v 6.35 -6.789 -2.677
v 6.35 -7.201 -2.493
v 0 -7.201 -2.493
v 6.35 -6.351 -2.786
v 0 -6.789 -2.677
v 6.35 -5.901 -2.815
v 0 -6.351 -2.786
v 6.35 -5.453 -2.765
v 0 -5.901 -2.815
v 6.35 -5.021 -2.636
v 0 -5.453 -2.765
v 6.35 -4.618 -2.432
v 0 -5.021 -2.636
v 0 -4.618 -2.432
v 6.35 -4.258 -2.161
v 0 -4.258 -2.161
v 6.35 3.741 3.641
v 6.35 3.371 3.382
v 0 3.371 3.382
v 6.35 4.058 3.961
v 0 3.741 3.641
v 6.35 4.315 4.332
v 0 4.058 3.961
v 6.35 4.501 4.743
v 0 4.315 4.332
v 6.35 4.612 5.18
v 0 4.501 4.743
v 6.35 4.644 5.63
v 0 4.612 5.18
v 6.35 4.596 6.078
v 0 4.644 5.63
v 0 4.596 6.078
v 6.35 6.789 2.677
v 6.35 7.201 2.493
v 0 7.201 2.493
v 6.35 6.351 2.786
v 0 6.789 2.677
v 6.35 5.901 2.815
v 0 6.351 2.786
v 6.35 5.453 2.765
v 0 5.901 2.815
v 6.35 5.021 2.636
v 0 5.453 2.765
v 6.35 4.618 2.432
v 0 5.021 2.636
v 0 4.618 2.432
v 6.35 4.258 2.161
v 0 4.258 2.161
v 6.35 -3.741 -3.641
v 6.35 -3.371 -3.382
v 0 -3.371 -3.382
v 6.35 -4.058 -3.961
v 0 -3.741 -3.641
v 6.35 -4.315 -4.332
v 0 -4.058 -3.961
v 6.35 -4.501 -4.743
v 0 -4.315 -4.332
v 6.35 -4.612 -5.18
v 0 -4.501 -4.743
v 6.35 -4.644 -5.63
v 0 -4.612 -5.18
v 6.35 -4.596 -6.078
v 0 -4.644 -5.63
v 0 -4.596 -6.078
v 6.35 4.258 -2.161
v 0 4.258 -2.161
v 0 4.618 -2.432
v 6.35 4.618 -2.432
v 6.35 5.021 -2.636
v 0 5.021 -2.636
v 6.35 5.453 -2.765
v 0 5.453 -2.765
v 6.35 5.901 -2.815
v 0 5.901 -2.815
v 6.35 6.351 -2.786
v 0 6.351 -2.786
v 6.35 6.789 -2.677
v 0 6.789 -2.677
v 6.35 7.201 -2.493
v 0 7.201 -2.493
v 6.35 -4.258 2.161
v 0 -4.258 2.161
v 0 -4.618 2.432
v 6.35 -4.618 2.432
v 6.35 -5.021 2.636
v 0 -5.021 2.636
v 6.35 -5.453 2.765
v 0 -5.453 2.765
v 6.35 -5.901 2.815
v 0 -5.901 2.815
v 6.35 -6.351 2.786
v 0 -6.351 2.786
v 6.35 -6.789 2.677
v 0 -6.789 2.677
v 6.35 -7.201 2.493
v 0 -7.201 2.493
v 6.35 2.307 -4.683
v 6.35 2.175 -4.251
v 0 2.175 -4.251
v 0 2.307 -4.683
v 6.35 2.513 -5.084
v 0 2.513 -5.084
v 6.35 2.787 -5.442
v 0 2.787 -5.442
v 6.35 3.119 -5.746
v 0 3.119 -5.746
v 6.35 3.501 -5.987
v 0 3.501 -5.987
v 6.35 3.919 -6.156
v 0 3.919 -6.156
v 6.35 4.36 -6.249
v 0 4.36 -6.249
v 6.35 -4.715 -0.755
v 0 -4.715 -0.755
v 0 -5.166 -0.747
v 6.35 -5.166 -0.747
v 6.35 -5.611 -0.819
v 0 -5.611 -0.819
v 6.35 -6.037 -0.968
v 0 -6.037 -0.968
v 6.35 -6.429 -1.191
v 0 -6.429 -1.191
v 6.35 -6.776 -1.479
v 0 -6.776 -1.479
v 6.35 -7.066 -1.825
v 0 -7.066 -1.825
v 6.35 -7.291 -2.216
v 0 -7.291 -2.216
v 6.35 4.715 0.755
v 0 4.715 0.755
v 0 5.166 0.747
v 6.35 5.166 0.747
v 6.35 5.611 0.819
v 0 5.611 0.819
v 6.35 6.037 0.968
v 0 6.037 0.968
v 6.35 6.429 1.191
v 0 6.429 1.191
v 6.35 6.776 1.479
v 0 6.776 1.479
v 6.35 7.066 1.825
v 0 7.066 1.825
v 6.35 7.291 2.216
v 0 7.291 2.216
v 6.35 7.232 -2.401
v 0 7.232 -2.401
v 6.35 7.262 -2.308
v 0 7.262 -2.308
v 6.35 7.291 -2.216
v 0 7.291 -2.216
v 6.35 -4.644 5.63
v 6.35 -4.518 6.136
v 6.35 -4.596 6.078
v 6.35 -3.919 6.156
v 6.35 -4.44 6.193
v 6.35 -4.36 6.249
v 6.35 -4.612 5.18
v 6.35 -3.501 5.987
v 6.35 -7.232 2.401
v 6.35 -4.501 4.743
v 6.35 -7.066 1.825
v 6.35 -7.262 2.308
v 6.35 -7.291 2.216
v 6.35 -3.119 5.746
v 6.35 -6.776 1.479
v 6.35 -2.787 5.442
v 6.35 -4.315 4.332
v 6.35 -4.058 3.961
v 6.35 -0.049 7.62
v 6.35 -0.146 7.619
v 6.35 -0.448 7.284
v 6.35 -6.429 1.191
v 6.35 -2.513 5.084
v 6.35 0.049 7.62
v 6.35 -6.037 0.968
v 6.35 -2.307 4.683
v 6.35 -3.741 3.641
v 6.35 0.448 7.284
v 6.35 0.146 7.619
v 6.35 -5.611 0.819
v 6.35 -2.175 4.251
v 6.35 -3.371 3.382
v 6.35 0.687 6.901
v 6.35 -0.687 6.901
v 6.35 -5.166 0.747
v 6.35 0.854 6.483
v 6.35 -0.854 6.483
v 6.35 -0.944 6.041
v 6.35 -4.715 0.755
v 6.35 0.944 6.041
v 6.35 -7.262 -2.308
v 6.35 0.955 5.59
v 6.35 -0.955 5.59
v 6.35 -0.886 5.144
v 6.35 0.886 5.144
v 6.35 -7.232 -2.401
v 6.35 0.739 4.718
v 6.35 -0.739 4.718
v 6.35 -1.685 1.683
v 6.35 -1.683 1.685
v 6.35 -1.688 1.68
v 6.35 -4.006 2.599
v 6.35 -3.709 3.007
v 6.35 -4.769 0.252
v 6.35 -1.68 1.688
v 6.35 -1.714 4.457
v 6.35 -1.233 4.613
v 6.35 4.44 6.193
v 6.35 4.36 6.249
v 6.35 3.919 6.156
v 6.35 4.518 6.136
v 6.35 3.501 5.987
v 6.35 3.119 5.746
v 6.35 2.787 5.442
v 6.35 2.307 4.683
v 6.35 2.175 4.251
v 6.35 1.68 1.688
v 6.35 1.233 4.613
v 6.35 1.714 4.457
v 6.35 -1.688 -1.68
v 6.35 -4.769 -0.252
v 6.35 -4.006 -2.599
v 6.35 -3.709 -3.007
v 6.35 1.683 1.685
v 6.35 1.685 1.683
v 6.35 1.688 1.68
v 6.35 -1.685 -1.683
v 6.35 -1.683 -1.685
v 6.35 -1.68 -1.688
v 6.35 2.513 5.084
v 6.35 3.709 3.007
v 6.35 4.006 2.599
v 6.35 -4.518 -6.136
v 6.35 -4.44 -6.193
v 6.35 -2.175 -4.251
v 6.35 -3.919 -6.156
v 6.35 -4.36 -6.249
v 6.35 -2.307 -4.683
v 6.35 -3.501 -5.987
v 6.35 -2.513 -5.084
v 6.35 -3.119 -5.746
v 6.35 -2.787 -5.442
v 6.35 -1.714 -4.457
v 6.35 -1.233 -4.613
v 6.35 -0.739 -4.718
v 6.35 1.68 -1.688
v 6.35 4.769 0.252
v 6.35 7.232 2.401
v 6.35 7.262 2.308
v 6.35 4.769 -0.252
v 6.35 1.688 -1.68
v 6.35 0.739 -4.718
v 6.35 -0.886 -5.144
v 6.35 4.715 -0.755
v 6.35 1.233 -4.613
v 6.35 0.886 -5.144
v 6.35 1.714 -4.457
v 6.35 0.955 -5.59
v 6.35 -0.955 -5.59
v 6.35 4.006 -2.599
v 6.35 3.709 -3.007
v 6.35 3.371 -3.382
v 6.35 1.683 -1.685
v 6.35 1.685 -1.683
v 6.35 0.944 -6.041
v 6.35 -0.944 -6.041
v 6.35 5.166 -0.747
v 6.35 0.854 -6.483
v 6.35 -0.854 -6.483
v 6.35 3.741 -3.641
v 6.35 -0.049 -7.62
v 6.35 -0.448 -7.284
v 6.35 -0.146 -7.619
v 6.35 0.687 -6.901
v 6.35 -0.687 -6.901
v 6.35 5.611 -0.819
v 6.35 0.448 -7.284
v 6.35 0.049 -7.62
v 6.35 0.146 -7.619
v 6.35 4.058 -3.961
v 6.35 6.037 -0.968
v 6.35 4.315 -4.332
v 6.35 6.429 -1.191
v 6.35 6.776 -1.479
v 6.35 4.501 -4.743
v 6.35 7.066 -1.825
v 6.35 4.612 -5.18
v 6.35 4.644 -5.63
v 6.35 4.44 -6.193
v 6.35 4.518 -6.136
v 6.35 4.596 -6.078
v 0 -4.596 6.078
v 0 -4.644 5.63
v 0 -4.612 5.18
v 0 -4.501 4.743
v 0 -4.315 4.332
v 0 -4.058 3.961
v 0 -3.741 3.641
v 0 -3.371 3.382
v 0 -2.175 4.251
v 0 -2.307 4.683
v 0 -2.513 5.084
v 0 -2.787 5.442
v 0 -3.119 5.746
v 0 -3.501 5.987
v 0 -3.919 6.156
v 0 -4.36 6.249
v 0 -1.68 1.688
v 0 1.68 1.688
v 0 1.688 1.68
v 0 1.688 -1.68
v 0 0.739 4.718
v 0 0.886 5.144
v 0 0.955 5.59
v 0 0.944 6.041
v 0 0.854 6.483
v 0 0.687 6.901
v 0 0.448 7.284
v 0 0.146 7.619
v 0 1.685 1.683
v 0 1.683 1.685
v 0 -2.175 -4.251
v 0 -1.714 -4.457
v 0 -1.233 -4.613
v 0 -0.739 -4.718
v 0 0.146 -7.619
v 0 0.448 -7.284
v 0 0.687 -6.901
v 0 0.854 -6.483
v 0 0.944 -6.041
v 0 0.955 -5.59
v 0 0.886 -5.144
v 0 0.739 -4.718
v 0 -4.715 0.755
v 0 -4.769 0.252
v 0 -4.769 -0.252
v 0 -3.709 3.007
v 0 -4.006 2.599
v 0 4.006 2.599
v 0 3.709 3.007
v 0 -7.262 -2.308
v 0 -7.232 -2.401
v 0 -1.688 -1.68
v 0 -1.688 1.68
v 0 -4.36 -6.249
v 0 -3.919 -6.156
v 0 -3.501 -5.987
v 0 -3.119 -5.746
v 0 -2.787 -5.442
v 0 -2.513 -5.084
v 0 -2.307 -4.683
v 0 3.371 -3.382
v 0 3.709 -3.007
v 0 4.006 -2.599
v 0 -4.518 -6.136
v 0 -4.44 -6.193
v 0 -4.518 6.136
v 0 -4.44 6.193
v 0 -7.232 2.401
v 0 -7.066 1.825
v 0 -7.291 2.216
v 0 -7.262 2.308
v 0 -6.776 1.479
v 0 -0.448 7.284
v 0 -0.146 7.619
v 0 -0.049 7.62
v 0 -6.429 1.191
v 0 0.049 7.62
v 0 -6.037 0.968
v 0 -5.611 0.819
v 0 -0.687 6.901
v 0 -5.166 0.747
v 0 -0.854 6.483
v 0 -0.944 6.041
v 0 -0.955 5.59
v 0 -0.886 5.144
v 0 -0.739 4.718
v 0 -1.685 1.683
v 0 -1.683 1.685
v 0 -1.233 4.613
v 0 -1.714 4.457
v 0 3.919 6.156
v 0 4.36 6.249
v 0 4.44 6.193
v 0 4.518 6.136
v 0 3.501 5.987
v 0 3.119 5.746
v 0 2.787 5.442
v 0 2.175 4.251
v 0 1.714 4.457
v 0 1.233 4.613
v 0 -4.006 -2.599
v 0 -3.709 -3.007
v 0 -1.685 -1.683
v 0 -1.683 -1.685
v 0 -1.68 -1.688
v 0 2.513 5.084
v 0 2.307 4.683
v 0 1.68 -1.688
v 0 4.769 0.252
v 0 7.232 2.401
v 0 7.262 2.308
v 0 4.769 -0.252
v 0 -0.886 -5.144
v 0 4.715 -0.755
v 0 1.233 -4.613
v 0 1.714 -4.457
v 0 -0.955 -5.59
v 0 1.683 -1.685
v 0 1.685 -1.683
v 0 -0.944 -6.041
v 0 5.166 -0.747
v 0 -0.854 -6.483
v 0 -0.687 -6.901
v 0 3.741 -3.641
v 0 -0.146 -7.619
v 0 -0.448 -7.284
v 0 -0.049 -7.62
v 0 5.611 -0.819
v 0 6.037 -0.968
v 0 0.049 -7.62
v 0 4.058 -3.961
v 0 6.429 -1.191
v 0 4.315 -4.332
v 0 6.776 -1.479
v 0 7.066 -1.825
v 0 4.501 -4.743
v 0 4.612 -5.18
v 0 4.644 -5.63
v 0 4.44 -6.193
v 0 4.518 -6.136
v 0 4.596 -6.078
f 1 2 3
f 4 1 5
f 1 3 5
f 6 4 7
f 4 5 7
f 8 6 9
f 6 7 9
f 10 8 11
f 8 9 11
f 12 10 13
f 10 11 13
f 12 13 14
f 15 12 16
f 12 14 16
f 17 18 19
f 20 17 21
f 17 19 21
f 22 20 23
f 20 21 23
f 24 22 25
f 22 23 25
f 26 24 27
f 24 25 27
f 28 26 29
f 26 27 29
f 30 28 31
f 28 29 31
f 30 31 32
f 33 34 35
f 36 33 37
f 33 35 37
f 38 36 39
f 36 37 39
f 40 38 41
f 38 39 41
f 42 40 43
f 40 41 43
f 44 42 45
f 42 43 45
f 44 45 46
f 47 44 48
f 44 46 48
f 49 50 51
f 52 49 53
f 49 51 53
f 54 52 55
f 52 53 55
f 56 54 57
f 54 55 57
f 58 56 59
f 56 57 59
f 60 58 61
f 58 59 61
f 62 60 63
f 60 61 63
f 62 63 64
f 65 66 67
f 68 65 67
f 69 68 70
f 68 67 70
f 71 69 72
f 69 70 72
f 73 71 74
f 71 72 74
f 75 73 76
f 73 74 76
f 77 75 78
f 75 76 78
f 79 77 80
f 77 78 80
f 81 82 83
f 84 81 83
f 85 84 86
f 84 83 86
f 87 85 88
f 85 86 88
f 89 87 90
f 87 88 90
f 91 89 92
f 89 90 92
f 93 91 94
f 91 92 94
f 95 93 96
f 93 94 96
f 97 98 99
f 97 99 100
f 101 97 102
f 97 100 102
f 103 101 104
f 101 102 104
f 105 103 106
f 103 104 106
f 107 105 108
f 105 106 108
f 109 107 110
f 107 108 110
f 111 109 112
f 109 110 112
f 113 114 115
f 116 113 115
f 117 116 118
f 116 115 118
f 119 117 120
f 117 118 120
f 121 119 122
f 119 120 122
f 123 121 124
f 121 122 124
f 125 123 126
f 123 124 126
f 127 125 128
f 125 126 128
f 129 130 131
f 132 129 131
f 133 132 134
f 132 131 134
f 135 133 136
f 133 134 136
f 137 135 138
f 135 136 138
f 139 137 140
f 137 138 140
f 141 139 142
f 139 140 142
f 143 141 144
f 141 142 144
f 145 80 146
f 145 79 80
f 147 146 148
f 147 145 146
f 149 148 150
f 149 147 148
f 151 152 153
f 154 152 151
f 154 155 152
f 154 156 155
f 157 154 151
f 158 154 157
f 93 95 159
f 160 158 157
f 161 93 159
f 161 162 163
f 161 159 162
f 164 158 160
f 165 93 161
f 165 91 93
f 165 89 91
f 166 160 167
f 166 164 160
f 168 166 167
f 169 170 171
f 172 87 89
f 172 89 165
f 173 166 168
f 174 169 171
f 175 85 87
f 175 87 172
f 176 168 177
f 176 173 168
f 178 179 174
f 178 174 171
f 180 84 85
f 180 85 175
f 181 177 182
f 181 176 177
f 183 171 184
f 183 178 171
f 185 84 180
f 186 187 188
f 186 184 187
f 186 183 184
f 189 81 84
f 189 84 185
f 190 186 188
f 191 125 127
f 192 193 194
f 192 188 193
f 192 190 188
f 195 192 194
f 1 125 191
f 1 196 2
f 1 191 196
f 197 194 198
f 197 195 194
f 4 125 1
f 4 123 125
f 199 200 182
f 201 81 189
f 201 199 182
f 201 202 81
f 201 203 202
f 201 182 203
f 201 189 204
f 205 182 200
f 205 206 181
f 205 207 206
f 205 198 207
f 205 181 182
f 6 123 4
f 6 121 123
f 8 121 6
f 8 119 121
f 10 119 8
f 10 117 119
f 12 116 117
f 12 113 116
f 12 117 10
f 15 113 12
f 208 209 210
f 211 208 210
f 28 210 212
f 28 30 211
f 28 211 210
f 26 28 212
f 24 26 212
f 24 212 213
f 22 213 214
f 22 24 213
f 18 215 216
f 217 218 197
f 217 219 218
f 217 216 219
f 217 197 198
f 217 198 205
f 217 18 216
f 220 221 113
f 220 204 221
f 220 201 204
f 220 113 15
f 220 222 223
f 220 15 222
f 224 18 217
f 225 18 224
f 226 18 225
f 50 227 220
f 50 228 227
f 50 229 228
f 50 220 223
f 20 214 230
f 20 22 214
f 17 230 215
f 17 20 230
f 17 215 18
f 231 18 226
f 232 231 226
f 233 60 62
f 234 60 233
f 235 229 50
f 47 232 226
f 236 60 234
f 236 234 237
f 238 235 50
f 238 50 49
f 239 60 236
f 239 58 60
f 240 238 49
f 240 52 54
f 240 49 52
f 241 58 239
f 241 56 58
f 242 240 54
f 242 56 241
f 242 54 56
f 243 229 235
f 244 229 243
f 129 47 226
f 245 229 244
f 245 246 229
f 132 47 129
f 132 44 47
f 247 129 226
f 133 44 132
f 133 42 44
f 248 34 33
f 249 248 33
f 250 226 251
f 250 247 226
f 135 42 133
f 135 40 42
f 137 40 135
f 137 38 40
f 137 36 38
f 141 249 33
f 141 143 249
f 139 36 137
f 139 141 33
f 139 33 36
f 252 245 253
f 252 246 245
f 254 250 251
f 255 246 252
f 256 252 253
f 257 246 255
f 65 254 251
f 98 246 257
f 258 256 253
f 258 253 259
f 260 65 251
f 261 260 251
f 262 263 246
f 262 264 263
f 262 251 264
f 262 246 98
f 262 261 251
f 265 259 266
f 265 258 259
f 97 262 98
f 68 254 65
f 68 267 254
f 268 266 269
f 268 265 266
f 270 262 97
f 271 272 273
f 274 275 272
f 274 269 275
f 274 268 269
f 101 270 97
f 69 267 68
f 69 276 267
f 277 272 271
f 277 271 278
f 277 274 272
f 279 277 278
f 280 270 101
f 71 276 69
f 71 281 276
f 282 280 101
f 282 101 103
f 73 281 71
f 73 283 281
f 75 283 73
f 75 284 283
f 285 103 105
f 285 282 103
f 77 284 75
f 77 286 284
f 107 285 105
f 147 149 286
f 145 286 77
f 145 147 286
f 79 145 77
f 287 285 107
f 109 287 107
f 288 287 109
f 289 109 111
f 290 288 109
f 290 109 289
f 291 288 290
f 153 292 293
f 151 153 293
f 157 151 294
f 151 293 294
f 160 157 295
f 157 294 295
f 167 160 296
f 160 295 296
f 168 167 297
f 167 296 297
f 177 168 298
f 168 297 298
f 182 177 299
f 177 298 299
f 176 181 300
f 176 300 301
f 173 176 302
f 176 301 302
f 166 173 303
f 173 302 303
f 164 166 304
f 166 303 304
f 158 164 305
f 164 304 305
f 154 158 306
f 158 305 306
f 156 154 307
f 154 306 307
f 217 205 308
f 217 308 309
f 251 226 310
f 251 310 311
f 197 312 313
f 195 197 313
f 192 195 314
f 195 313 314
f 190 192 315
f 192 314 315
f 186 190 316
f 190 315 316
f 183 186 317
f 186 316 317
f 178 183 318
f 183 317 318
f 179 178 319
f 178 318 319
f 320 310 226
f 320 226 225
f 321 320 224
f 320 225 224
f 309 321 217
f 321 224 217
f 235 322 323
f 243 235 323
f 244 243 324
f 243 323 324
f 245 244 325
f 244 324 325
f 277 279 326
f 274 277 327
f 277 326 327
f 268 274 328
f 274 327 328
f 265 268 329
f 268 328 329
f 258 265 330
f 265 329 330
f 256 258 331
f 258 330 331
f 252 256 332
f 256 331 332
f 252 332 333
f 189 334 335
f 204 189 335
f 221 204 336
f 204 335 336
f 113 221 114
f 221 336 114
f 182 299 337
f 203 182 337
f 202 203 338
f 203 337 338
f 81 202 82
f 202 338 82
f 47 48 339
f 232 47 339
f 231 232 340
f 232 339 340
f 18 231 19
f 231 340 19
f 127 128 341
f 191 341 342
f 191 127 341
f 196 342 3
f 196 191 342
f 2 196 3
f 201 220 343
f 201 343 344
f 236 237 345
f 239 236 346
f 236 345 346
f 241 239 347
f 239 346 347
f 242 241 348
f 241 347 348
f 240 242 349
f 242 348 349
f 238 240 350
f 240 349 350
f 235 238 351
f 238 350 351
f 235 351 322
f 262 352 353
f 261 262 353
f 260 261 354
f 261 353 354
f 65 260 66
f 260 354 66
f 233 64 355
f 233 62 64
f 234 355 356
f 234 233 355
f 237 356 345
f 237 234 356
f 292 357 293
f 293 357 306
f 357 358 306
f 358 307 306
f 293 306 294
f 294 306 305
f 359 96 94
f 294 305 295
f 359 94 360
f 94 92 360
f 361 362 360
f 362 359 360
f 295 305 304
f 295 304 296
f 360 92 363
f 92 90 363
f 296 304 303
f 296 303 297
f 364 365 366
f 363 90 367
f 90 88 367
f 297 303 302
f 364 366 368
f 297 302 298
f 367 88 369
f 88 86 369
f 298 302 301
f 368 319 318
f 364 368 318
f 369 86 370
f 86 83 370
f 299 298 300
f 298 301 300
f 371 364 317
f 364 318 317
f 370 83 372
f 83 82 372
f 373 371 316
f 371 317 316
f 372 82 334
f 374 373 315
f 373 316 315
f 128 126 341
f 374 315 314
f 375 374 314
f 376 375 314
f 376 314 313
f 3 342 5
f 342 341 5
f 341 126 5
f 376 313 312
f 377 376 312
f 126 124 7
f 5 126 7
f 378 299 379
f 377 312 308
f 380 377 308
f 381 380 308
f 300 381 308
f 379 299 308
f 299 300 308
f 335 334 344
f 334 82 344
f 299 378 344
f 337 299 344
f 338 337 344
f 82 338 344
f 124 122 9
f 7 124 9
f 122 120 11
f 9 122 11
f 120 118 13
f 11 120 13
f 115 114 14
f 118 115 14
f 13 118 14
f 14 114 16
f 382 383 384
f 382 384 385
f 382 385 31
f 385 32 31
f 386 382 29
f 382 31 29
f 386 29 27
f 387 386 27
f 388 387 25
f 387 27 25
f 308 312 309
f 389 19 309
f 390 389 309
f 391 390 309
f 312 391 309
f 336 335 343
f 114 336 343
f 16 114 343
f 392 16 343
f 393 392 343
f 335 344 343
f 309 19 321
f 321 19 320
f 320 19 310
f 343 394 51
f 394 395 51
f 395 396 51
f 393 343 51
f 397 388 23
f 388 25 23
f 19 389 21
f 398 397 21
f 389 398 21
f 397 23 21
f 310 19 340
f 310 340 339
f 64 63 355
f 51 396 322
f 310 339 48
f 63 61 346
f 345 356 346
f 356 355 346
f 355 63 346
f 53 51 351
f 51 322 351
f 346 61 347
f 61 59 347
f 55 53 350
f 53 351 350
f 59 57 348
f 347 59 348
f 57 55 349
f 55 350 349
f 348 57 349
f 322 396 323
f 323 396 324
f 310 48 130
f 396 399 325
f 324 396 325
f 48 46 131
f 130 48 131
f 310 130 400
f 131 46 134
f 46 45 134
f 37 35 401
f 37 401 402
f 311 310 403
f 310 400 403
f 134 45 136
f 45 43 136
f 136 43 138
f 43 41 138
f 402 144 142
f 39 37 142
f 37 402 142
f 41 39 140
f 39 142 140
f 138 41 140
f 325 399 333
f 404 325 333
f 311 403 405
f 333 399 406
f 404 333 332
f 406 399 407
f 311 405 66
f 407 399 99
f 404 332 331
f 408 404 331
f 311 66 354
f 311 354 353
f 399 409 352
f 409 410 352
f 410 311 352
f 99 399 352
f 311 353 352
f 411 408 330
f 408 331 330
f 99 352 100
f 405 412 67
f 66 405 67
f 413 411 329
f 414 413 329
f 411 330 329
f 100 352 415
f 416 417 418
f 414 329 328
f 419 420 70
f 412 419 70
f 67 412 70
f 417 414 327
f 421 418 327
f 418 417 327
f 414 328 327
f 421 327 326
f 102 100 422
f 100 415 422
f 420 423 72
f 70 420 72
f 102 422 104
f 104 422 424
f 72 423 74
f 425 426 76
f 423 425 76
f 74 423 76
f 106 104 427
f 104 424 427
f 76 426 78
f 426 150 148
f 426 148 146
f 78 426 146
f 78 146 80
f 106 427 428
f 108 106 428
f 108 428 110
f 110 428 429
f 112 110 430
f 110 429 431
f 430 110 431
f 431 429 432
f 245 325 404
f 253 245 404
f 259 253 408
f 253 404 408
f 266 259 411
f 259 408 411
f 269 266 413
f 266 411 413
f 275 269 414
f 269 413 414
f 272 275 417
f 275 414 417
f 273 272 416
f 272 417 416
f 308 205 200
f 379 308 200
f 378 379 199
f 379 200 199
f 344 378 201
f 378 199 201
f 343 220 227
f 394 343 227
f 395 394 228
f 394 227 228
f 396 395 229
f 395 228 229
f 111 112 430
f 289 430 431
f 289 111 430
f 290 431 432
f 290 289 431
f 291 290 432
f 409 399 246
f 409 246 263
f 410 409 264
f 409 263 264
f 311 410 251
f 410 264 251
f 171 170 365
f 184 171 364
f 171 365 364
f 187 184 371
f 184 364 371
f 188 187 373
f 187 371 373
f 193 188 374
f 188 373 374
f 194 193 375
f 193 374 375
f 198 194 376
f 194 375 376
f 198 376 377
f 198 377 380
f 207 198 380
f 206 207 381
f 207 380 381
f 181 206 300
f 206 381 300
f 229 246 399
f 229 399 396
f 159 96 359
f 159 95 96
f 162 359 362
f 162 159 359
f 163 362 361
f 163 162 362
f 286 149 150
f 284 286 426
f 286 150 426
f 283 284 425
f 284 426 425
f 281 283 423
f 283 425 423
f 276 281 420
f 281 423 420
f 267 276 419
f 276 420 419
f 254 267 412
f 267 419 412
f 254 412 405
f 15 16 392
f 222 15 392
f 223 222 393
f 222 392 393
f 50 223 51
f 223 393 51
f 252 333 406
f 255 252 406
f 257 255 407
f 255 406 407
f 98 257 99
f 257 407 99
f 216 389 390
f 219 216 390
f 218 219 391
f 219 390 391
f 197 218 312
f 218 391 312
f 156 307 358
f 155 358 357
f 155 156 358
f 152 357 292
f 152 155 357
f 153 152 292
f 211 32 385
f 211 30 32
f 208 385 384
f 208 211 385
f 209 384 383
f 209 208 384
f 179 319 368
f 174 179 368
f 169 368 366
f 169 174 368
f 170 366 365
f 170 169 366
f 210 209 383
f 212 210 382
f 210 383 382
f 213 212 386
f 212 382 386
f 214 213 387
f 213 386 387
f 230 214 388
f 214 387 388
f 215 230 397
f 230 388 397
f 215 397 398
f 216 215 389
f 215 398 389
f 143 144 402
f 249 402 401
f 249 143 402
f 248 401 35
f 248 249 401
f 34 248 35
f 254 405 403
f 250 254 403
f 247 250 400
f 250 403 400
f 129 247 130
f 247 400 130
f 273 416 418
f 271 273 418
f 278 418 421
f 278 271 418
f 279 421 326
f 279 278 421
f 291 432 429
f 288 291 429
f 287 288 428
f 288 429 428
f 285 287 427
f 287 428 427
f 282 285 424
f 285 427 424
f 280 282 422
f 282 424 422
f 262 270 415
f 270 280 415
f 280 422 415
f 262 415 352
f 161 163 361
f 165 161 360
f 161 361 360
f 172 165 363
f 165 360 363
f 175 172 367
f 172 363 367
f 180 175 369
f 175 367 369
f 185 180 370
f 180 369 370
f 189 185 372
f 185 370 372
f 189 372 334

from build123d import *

# Parameters (mm, degrees)
BASPROSKE_W         = 6.35
BASPROSKE_H         = 7.62
TOOTHCUT_DEPTH      = 13.508049408
TEETHCUTS_COUNT     = 10
TEETHCUTS_ANGLE     = 324
BORSKE_R            = 2.38125
BORE_DEPTH          = 50.8000508
BOSS_EXTRUDE1_DEPTH = 6.35


with BuildPart() as part:
    # BasProSke → Base-Revolve (revolve)
    with BuildSketch(Plane(origin=(0, 0, 0), x_dir=(1, 0, 0), z_dir=(0, 1, 0)), mode=Mode.PRIVATE) as base_revolve_sk:
        with Locations((3.175, 3.81)):
            Rectangle(BASPROSKE_W, BASPROSKE_H)
    revolve(base_revolve_sk.sketch.rotate(Axis((-10, 0, 0), (1, 0, 0)), 180), axis=Axis((-10, 0, 0), (1, 0, 0)))

    # TooCutSke → ToothCut (cut, through all)
    with BuildSketch(Plane(origin=(0, 0, 0), x_dir=(0, 0, -1), z_dir=(1, 0, 0))):
        with BuildLine():
            ThreePointArc((0.754581835, 4.715203208), (0, 4.7752), (-0.754581835, 4.715203208))
            ThreePointArc((-0.754581835, 4.715203208), (-1.08060133, 6.254605234), (-2.250824617, 7.306567573))
            ThreePointArc((-2.250824617, 7.306567573), (0, 7.6454), (2.250824617, 7.306567573))
            ThreePointArc((2.250824617, 7.306567573), (1.08060133, 6.254605234), (0.754581835, 4.715203208))
        make_face()
    toothcut = extrude(amount=TOOTHCUT_DEPTH, mode=Mode.SUBTRACT)

    # TeethCuts: ToothCut ×10 about axis
    teethcuts_axis = Axis((-10, 0, 0), (1, 0, 0))
    for i in range(1, TEETHCUTS_COUNT):
        add(toothcut.rotate(teethcuts_axis, i * TEETHCUTS_ANGLE / (TEETHCUTS_COUNT - 1)), mode=Mode.SUBTRACT)

    # BorSke → Bore (cut, symmetric)
    with BuildSketch(Plane(origin=(0, 0, 0), x_dir=(0, 0, -1), z_dir=(1, 0, 0))):
        with Locations(Location((0, 0, 0), (0, 0, 180))):
            Circle(BORSKE_R)
    extrude(amount=BORE_DEPTH, both=True, mode=Mode.SUBTRACT)

    # Sketch1 → Boss-Extrude1 (add)
    with BuildSketch(Plane(origin=(6.35, 0, 0), x_dir=(0, 0, -1), z_dir=(1, 0, 0))):
        with BuildLine():
            Line((-1.680087888, 1.6875), (1.680087888, 1.6875))
            ThreePointArc((1.680087888, 1.6875), (0, 2.38125), (-1.680087888, 1.6875))
        make_face()
        with BuildLine():
            ThreePointArc((-1.6875, 1.680087888), (-2.38125, 0), (-1.6875, -1.680087888))
            Line((-1.6875, -1.680087888), (-1.6875, 1.680087888))
        make_face()
        with BuildLine():
            ThreePointArc((-1.680087888, -1.6875), (0, -2.38125), (1.680087888, -1.6875))
            Line((1.680087888, -1.6875), (-1.680087888, -1.6875))
        make_face()
        with BuildLine():
            Line((1.6875, 1.680087888), (1.6875, -1.680087888))
            ThreePointArc((1.6875, -1.680087888), (2.200989657, -0.908843272), (2.38125, 0))
            ThreePointArc((2.38125, 0), (2.200989657, 0.908843272), (1.6875, 1.680087888))
        make_face()
    extrude(amount=-BOSS_EXTRUDE1_DEPTH)


solid = part.part
